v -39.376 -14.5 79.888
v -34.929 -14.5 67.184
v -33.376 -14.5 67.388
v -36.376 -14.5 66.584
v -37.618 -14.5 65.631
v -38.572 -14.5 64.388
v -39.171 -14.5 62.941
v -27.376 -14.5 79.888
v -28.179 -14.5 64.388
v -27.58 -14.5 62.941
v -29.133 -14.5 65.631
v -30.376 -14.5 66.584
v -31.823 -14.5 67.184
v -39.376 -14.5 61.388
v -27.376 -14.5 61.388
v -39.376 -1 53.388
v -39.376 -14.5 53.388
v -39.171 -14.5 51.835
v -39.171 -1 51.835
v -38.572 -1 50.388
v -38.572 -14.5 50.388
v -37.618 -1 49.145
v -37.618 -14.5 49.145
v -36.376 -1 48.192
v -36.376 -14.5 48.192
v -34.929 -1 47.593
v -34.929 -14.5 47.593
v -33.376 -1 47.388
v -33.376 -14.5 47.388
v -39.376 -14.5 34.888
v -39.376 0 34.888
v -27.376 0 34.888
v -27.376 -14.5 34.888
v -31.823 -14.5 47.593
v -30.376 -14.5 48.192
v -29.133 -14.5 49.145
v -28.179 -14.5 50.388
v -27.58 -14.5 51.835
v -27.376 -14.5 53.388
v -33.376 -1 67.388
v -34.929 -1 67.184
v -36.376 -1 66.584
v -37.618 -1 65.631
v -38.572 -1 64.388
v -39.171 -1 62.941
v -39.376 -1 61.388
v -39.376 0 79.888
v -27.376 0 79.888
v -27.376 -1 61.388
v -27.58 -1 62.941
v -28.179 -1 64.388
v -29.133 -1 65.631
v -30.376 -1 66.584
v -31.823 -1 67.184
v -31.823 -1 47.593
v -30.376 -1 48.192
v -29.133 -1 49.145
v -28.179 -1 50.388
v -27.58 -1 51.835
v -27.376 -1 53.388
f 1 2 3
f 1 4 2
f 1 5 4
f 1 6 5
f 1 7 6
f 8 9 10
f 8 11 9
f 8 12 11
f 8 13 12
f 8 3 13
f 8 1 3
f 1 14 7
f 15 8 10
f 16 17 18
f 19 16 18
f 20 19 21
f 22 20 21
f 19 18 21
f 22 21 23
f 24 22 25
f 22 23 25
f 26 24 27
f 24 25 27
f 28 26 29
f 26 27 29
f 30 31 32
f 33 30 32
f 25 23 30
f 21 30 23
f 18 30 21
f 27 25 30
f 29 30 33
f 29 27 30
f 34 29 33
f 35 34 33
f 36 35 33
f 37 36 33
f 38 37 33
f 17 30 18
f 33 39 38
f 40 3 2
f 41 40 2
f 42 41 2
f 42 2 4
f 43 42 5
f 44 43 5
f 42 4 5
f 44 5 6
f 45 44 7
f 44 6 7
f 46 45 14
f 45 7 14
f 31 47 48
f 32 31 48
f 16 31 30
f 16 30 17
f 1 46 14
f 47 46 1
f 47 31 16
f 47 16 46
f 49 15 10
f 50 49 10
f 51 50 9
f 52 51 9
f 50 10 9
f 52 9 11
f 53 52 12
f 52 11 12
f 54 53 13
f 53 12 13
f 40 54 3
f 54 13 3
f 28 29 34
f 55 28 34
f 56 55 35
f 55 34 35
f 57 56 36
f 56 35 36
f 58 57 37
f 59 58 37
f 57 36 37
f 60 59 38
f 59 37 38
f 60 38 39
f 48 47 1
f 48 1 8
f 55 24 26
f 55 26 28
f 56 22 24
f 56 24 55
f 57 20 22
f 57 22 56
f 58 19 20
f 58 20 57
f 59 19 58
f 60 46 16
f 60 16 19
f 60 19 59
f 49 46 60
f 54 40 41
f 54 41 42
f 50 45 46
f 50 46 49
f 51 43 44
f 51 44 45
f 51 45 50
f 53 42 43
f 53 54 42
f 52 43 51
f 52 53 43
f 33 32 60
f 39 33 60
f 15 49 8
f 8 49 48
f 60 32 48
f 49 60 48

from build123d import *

# Parameters (mm, degrees)
F0_W     = 12
F0_H     = 45
F1_DEPTH = 14.5
F3_DEPTH = 13.5


with BuildPart() as f1:
    # F0 (on Front) → F1 (new body)
    with BuildSketch(Plane.XZ):
        with Locations((-33.3756405115, 57.3880812526)):
            Rectangle(F0_W, F0_H)
    extrude(amount=F1_DEPTH)

    # F2 (on face) → F3 (cut)
    with BuildSketch(Plane.XZ.offset(14.5)):
        with BuildLine():
            ThreePointArc((-37.8477764665, 57.3880812526), (-38.9806746653, 59.2471487139), (-39.3756405115, 61.3880812526))
            Line((-39.3756405115, 61.3880812526), (-39.3756405115, 53.3880812526))
            ThreePointArc((-39.3756405115, 53.3880812526), (-38.9806746653, 55.5290137912), (-37.8477764665, 57.3880812526))
        make_face()
        with BuildLine():
            Line((-27.3756405115, 53.3880812526), (-27.3756405115, 61.3880812526))
            ThreePointArc((-27.3756405115, 61.3880812526), (-27.7706063577, 59.2471487139), (-28.9035045565, 57.3880812526))
            ThreePointArc((-28.9035045565, 57.3880812526), (-27.7706063577, 55.5290137912), (-27.3756405115, 53.3880812526))
        make_face()
        with BuildLine():
            ThreePointArc((-27.3756405115, 61.3880812526), (-29.1329998244, 65.6307219397), (-33.3756405115, 67.3880812526))
            ThreePointArc((-33.3756405115, 67.3880812526), (-37.6182811986, 65.6307219397), (-39.3756405115, 61.3880812526))
            ThreePointArc((-39.3756405115, 61.3880812526), (-38.9806746653, 59.2471487139), (-37.8477764665, 57.3880812526))
            ThreePointArc((-37.8477764665, 57.3880812526), (-33.3756405115, 59.3880812526), (-28.9035045565, 57.3880812526))
            ThreePointArc((-28.9035045565, 57.3880812526), (-27.7706063577, 59.2471487139), (-27.3756405115, 61.3880812526))
        make_face()
        with BuildLine():
            ThreePointArc((-37.8477764665, 57.3880812526), (-38.9806746653, 55.5290137912), (-39.3756405115, 53.3880812526))
            ThreePointArc((-39.3756405115, 53.3880812526), (-37.6182811986, 49.1454405655), (-33.3756405115, 47.3880812526))
            ThreePointArc((-33.3756405115, 47.3880812526), (-29.1329998244, 49.1454405655), (-27.3756405115, 53.3880812526))
            ThreePointArc((-27.3756405115, 53.3880812526), (-27.7706063577, 55.5290137912), (-28.9035045565, 57.3880812526))
            ThreePointArc((-28.9035045565, 57.3880812526), (-33.3756405115, 55.3880812526), (-37.8477764665, 57.3880812526))
        make_face()
        with BuildLine():
            ThreePointArc((-28.9035045565, 57.3880812526), (-33.3756405115, 59.3880812526), (-37.8477764665, 57.3880812526))
            ThreePointArc((-37.8477764665, 57.3880812526), (-33.3756405115, 55.3880812526), (-28.9035045565, 57.3880812526))
        make_face()
    extrude(amount=-F3_DEPTH, mode=Mode.SUBTRACT)


solid = f1.part
